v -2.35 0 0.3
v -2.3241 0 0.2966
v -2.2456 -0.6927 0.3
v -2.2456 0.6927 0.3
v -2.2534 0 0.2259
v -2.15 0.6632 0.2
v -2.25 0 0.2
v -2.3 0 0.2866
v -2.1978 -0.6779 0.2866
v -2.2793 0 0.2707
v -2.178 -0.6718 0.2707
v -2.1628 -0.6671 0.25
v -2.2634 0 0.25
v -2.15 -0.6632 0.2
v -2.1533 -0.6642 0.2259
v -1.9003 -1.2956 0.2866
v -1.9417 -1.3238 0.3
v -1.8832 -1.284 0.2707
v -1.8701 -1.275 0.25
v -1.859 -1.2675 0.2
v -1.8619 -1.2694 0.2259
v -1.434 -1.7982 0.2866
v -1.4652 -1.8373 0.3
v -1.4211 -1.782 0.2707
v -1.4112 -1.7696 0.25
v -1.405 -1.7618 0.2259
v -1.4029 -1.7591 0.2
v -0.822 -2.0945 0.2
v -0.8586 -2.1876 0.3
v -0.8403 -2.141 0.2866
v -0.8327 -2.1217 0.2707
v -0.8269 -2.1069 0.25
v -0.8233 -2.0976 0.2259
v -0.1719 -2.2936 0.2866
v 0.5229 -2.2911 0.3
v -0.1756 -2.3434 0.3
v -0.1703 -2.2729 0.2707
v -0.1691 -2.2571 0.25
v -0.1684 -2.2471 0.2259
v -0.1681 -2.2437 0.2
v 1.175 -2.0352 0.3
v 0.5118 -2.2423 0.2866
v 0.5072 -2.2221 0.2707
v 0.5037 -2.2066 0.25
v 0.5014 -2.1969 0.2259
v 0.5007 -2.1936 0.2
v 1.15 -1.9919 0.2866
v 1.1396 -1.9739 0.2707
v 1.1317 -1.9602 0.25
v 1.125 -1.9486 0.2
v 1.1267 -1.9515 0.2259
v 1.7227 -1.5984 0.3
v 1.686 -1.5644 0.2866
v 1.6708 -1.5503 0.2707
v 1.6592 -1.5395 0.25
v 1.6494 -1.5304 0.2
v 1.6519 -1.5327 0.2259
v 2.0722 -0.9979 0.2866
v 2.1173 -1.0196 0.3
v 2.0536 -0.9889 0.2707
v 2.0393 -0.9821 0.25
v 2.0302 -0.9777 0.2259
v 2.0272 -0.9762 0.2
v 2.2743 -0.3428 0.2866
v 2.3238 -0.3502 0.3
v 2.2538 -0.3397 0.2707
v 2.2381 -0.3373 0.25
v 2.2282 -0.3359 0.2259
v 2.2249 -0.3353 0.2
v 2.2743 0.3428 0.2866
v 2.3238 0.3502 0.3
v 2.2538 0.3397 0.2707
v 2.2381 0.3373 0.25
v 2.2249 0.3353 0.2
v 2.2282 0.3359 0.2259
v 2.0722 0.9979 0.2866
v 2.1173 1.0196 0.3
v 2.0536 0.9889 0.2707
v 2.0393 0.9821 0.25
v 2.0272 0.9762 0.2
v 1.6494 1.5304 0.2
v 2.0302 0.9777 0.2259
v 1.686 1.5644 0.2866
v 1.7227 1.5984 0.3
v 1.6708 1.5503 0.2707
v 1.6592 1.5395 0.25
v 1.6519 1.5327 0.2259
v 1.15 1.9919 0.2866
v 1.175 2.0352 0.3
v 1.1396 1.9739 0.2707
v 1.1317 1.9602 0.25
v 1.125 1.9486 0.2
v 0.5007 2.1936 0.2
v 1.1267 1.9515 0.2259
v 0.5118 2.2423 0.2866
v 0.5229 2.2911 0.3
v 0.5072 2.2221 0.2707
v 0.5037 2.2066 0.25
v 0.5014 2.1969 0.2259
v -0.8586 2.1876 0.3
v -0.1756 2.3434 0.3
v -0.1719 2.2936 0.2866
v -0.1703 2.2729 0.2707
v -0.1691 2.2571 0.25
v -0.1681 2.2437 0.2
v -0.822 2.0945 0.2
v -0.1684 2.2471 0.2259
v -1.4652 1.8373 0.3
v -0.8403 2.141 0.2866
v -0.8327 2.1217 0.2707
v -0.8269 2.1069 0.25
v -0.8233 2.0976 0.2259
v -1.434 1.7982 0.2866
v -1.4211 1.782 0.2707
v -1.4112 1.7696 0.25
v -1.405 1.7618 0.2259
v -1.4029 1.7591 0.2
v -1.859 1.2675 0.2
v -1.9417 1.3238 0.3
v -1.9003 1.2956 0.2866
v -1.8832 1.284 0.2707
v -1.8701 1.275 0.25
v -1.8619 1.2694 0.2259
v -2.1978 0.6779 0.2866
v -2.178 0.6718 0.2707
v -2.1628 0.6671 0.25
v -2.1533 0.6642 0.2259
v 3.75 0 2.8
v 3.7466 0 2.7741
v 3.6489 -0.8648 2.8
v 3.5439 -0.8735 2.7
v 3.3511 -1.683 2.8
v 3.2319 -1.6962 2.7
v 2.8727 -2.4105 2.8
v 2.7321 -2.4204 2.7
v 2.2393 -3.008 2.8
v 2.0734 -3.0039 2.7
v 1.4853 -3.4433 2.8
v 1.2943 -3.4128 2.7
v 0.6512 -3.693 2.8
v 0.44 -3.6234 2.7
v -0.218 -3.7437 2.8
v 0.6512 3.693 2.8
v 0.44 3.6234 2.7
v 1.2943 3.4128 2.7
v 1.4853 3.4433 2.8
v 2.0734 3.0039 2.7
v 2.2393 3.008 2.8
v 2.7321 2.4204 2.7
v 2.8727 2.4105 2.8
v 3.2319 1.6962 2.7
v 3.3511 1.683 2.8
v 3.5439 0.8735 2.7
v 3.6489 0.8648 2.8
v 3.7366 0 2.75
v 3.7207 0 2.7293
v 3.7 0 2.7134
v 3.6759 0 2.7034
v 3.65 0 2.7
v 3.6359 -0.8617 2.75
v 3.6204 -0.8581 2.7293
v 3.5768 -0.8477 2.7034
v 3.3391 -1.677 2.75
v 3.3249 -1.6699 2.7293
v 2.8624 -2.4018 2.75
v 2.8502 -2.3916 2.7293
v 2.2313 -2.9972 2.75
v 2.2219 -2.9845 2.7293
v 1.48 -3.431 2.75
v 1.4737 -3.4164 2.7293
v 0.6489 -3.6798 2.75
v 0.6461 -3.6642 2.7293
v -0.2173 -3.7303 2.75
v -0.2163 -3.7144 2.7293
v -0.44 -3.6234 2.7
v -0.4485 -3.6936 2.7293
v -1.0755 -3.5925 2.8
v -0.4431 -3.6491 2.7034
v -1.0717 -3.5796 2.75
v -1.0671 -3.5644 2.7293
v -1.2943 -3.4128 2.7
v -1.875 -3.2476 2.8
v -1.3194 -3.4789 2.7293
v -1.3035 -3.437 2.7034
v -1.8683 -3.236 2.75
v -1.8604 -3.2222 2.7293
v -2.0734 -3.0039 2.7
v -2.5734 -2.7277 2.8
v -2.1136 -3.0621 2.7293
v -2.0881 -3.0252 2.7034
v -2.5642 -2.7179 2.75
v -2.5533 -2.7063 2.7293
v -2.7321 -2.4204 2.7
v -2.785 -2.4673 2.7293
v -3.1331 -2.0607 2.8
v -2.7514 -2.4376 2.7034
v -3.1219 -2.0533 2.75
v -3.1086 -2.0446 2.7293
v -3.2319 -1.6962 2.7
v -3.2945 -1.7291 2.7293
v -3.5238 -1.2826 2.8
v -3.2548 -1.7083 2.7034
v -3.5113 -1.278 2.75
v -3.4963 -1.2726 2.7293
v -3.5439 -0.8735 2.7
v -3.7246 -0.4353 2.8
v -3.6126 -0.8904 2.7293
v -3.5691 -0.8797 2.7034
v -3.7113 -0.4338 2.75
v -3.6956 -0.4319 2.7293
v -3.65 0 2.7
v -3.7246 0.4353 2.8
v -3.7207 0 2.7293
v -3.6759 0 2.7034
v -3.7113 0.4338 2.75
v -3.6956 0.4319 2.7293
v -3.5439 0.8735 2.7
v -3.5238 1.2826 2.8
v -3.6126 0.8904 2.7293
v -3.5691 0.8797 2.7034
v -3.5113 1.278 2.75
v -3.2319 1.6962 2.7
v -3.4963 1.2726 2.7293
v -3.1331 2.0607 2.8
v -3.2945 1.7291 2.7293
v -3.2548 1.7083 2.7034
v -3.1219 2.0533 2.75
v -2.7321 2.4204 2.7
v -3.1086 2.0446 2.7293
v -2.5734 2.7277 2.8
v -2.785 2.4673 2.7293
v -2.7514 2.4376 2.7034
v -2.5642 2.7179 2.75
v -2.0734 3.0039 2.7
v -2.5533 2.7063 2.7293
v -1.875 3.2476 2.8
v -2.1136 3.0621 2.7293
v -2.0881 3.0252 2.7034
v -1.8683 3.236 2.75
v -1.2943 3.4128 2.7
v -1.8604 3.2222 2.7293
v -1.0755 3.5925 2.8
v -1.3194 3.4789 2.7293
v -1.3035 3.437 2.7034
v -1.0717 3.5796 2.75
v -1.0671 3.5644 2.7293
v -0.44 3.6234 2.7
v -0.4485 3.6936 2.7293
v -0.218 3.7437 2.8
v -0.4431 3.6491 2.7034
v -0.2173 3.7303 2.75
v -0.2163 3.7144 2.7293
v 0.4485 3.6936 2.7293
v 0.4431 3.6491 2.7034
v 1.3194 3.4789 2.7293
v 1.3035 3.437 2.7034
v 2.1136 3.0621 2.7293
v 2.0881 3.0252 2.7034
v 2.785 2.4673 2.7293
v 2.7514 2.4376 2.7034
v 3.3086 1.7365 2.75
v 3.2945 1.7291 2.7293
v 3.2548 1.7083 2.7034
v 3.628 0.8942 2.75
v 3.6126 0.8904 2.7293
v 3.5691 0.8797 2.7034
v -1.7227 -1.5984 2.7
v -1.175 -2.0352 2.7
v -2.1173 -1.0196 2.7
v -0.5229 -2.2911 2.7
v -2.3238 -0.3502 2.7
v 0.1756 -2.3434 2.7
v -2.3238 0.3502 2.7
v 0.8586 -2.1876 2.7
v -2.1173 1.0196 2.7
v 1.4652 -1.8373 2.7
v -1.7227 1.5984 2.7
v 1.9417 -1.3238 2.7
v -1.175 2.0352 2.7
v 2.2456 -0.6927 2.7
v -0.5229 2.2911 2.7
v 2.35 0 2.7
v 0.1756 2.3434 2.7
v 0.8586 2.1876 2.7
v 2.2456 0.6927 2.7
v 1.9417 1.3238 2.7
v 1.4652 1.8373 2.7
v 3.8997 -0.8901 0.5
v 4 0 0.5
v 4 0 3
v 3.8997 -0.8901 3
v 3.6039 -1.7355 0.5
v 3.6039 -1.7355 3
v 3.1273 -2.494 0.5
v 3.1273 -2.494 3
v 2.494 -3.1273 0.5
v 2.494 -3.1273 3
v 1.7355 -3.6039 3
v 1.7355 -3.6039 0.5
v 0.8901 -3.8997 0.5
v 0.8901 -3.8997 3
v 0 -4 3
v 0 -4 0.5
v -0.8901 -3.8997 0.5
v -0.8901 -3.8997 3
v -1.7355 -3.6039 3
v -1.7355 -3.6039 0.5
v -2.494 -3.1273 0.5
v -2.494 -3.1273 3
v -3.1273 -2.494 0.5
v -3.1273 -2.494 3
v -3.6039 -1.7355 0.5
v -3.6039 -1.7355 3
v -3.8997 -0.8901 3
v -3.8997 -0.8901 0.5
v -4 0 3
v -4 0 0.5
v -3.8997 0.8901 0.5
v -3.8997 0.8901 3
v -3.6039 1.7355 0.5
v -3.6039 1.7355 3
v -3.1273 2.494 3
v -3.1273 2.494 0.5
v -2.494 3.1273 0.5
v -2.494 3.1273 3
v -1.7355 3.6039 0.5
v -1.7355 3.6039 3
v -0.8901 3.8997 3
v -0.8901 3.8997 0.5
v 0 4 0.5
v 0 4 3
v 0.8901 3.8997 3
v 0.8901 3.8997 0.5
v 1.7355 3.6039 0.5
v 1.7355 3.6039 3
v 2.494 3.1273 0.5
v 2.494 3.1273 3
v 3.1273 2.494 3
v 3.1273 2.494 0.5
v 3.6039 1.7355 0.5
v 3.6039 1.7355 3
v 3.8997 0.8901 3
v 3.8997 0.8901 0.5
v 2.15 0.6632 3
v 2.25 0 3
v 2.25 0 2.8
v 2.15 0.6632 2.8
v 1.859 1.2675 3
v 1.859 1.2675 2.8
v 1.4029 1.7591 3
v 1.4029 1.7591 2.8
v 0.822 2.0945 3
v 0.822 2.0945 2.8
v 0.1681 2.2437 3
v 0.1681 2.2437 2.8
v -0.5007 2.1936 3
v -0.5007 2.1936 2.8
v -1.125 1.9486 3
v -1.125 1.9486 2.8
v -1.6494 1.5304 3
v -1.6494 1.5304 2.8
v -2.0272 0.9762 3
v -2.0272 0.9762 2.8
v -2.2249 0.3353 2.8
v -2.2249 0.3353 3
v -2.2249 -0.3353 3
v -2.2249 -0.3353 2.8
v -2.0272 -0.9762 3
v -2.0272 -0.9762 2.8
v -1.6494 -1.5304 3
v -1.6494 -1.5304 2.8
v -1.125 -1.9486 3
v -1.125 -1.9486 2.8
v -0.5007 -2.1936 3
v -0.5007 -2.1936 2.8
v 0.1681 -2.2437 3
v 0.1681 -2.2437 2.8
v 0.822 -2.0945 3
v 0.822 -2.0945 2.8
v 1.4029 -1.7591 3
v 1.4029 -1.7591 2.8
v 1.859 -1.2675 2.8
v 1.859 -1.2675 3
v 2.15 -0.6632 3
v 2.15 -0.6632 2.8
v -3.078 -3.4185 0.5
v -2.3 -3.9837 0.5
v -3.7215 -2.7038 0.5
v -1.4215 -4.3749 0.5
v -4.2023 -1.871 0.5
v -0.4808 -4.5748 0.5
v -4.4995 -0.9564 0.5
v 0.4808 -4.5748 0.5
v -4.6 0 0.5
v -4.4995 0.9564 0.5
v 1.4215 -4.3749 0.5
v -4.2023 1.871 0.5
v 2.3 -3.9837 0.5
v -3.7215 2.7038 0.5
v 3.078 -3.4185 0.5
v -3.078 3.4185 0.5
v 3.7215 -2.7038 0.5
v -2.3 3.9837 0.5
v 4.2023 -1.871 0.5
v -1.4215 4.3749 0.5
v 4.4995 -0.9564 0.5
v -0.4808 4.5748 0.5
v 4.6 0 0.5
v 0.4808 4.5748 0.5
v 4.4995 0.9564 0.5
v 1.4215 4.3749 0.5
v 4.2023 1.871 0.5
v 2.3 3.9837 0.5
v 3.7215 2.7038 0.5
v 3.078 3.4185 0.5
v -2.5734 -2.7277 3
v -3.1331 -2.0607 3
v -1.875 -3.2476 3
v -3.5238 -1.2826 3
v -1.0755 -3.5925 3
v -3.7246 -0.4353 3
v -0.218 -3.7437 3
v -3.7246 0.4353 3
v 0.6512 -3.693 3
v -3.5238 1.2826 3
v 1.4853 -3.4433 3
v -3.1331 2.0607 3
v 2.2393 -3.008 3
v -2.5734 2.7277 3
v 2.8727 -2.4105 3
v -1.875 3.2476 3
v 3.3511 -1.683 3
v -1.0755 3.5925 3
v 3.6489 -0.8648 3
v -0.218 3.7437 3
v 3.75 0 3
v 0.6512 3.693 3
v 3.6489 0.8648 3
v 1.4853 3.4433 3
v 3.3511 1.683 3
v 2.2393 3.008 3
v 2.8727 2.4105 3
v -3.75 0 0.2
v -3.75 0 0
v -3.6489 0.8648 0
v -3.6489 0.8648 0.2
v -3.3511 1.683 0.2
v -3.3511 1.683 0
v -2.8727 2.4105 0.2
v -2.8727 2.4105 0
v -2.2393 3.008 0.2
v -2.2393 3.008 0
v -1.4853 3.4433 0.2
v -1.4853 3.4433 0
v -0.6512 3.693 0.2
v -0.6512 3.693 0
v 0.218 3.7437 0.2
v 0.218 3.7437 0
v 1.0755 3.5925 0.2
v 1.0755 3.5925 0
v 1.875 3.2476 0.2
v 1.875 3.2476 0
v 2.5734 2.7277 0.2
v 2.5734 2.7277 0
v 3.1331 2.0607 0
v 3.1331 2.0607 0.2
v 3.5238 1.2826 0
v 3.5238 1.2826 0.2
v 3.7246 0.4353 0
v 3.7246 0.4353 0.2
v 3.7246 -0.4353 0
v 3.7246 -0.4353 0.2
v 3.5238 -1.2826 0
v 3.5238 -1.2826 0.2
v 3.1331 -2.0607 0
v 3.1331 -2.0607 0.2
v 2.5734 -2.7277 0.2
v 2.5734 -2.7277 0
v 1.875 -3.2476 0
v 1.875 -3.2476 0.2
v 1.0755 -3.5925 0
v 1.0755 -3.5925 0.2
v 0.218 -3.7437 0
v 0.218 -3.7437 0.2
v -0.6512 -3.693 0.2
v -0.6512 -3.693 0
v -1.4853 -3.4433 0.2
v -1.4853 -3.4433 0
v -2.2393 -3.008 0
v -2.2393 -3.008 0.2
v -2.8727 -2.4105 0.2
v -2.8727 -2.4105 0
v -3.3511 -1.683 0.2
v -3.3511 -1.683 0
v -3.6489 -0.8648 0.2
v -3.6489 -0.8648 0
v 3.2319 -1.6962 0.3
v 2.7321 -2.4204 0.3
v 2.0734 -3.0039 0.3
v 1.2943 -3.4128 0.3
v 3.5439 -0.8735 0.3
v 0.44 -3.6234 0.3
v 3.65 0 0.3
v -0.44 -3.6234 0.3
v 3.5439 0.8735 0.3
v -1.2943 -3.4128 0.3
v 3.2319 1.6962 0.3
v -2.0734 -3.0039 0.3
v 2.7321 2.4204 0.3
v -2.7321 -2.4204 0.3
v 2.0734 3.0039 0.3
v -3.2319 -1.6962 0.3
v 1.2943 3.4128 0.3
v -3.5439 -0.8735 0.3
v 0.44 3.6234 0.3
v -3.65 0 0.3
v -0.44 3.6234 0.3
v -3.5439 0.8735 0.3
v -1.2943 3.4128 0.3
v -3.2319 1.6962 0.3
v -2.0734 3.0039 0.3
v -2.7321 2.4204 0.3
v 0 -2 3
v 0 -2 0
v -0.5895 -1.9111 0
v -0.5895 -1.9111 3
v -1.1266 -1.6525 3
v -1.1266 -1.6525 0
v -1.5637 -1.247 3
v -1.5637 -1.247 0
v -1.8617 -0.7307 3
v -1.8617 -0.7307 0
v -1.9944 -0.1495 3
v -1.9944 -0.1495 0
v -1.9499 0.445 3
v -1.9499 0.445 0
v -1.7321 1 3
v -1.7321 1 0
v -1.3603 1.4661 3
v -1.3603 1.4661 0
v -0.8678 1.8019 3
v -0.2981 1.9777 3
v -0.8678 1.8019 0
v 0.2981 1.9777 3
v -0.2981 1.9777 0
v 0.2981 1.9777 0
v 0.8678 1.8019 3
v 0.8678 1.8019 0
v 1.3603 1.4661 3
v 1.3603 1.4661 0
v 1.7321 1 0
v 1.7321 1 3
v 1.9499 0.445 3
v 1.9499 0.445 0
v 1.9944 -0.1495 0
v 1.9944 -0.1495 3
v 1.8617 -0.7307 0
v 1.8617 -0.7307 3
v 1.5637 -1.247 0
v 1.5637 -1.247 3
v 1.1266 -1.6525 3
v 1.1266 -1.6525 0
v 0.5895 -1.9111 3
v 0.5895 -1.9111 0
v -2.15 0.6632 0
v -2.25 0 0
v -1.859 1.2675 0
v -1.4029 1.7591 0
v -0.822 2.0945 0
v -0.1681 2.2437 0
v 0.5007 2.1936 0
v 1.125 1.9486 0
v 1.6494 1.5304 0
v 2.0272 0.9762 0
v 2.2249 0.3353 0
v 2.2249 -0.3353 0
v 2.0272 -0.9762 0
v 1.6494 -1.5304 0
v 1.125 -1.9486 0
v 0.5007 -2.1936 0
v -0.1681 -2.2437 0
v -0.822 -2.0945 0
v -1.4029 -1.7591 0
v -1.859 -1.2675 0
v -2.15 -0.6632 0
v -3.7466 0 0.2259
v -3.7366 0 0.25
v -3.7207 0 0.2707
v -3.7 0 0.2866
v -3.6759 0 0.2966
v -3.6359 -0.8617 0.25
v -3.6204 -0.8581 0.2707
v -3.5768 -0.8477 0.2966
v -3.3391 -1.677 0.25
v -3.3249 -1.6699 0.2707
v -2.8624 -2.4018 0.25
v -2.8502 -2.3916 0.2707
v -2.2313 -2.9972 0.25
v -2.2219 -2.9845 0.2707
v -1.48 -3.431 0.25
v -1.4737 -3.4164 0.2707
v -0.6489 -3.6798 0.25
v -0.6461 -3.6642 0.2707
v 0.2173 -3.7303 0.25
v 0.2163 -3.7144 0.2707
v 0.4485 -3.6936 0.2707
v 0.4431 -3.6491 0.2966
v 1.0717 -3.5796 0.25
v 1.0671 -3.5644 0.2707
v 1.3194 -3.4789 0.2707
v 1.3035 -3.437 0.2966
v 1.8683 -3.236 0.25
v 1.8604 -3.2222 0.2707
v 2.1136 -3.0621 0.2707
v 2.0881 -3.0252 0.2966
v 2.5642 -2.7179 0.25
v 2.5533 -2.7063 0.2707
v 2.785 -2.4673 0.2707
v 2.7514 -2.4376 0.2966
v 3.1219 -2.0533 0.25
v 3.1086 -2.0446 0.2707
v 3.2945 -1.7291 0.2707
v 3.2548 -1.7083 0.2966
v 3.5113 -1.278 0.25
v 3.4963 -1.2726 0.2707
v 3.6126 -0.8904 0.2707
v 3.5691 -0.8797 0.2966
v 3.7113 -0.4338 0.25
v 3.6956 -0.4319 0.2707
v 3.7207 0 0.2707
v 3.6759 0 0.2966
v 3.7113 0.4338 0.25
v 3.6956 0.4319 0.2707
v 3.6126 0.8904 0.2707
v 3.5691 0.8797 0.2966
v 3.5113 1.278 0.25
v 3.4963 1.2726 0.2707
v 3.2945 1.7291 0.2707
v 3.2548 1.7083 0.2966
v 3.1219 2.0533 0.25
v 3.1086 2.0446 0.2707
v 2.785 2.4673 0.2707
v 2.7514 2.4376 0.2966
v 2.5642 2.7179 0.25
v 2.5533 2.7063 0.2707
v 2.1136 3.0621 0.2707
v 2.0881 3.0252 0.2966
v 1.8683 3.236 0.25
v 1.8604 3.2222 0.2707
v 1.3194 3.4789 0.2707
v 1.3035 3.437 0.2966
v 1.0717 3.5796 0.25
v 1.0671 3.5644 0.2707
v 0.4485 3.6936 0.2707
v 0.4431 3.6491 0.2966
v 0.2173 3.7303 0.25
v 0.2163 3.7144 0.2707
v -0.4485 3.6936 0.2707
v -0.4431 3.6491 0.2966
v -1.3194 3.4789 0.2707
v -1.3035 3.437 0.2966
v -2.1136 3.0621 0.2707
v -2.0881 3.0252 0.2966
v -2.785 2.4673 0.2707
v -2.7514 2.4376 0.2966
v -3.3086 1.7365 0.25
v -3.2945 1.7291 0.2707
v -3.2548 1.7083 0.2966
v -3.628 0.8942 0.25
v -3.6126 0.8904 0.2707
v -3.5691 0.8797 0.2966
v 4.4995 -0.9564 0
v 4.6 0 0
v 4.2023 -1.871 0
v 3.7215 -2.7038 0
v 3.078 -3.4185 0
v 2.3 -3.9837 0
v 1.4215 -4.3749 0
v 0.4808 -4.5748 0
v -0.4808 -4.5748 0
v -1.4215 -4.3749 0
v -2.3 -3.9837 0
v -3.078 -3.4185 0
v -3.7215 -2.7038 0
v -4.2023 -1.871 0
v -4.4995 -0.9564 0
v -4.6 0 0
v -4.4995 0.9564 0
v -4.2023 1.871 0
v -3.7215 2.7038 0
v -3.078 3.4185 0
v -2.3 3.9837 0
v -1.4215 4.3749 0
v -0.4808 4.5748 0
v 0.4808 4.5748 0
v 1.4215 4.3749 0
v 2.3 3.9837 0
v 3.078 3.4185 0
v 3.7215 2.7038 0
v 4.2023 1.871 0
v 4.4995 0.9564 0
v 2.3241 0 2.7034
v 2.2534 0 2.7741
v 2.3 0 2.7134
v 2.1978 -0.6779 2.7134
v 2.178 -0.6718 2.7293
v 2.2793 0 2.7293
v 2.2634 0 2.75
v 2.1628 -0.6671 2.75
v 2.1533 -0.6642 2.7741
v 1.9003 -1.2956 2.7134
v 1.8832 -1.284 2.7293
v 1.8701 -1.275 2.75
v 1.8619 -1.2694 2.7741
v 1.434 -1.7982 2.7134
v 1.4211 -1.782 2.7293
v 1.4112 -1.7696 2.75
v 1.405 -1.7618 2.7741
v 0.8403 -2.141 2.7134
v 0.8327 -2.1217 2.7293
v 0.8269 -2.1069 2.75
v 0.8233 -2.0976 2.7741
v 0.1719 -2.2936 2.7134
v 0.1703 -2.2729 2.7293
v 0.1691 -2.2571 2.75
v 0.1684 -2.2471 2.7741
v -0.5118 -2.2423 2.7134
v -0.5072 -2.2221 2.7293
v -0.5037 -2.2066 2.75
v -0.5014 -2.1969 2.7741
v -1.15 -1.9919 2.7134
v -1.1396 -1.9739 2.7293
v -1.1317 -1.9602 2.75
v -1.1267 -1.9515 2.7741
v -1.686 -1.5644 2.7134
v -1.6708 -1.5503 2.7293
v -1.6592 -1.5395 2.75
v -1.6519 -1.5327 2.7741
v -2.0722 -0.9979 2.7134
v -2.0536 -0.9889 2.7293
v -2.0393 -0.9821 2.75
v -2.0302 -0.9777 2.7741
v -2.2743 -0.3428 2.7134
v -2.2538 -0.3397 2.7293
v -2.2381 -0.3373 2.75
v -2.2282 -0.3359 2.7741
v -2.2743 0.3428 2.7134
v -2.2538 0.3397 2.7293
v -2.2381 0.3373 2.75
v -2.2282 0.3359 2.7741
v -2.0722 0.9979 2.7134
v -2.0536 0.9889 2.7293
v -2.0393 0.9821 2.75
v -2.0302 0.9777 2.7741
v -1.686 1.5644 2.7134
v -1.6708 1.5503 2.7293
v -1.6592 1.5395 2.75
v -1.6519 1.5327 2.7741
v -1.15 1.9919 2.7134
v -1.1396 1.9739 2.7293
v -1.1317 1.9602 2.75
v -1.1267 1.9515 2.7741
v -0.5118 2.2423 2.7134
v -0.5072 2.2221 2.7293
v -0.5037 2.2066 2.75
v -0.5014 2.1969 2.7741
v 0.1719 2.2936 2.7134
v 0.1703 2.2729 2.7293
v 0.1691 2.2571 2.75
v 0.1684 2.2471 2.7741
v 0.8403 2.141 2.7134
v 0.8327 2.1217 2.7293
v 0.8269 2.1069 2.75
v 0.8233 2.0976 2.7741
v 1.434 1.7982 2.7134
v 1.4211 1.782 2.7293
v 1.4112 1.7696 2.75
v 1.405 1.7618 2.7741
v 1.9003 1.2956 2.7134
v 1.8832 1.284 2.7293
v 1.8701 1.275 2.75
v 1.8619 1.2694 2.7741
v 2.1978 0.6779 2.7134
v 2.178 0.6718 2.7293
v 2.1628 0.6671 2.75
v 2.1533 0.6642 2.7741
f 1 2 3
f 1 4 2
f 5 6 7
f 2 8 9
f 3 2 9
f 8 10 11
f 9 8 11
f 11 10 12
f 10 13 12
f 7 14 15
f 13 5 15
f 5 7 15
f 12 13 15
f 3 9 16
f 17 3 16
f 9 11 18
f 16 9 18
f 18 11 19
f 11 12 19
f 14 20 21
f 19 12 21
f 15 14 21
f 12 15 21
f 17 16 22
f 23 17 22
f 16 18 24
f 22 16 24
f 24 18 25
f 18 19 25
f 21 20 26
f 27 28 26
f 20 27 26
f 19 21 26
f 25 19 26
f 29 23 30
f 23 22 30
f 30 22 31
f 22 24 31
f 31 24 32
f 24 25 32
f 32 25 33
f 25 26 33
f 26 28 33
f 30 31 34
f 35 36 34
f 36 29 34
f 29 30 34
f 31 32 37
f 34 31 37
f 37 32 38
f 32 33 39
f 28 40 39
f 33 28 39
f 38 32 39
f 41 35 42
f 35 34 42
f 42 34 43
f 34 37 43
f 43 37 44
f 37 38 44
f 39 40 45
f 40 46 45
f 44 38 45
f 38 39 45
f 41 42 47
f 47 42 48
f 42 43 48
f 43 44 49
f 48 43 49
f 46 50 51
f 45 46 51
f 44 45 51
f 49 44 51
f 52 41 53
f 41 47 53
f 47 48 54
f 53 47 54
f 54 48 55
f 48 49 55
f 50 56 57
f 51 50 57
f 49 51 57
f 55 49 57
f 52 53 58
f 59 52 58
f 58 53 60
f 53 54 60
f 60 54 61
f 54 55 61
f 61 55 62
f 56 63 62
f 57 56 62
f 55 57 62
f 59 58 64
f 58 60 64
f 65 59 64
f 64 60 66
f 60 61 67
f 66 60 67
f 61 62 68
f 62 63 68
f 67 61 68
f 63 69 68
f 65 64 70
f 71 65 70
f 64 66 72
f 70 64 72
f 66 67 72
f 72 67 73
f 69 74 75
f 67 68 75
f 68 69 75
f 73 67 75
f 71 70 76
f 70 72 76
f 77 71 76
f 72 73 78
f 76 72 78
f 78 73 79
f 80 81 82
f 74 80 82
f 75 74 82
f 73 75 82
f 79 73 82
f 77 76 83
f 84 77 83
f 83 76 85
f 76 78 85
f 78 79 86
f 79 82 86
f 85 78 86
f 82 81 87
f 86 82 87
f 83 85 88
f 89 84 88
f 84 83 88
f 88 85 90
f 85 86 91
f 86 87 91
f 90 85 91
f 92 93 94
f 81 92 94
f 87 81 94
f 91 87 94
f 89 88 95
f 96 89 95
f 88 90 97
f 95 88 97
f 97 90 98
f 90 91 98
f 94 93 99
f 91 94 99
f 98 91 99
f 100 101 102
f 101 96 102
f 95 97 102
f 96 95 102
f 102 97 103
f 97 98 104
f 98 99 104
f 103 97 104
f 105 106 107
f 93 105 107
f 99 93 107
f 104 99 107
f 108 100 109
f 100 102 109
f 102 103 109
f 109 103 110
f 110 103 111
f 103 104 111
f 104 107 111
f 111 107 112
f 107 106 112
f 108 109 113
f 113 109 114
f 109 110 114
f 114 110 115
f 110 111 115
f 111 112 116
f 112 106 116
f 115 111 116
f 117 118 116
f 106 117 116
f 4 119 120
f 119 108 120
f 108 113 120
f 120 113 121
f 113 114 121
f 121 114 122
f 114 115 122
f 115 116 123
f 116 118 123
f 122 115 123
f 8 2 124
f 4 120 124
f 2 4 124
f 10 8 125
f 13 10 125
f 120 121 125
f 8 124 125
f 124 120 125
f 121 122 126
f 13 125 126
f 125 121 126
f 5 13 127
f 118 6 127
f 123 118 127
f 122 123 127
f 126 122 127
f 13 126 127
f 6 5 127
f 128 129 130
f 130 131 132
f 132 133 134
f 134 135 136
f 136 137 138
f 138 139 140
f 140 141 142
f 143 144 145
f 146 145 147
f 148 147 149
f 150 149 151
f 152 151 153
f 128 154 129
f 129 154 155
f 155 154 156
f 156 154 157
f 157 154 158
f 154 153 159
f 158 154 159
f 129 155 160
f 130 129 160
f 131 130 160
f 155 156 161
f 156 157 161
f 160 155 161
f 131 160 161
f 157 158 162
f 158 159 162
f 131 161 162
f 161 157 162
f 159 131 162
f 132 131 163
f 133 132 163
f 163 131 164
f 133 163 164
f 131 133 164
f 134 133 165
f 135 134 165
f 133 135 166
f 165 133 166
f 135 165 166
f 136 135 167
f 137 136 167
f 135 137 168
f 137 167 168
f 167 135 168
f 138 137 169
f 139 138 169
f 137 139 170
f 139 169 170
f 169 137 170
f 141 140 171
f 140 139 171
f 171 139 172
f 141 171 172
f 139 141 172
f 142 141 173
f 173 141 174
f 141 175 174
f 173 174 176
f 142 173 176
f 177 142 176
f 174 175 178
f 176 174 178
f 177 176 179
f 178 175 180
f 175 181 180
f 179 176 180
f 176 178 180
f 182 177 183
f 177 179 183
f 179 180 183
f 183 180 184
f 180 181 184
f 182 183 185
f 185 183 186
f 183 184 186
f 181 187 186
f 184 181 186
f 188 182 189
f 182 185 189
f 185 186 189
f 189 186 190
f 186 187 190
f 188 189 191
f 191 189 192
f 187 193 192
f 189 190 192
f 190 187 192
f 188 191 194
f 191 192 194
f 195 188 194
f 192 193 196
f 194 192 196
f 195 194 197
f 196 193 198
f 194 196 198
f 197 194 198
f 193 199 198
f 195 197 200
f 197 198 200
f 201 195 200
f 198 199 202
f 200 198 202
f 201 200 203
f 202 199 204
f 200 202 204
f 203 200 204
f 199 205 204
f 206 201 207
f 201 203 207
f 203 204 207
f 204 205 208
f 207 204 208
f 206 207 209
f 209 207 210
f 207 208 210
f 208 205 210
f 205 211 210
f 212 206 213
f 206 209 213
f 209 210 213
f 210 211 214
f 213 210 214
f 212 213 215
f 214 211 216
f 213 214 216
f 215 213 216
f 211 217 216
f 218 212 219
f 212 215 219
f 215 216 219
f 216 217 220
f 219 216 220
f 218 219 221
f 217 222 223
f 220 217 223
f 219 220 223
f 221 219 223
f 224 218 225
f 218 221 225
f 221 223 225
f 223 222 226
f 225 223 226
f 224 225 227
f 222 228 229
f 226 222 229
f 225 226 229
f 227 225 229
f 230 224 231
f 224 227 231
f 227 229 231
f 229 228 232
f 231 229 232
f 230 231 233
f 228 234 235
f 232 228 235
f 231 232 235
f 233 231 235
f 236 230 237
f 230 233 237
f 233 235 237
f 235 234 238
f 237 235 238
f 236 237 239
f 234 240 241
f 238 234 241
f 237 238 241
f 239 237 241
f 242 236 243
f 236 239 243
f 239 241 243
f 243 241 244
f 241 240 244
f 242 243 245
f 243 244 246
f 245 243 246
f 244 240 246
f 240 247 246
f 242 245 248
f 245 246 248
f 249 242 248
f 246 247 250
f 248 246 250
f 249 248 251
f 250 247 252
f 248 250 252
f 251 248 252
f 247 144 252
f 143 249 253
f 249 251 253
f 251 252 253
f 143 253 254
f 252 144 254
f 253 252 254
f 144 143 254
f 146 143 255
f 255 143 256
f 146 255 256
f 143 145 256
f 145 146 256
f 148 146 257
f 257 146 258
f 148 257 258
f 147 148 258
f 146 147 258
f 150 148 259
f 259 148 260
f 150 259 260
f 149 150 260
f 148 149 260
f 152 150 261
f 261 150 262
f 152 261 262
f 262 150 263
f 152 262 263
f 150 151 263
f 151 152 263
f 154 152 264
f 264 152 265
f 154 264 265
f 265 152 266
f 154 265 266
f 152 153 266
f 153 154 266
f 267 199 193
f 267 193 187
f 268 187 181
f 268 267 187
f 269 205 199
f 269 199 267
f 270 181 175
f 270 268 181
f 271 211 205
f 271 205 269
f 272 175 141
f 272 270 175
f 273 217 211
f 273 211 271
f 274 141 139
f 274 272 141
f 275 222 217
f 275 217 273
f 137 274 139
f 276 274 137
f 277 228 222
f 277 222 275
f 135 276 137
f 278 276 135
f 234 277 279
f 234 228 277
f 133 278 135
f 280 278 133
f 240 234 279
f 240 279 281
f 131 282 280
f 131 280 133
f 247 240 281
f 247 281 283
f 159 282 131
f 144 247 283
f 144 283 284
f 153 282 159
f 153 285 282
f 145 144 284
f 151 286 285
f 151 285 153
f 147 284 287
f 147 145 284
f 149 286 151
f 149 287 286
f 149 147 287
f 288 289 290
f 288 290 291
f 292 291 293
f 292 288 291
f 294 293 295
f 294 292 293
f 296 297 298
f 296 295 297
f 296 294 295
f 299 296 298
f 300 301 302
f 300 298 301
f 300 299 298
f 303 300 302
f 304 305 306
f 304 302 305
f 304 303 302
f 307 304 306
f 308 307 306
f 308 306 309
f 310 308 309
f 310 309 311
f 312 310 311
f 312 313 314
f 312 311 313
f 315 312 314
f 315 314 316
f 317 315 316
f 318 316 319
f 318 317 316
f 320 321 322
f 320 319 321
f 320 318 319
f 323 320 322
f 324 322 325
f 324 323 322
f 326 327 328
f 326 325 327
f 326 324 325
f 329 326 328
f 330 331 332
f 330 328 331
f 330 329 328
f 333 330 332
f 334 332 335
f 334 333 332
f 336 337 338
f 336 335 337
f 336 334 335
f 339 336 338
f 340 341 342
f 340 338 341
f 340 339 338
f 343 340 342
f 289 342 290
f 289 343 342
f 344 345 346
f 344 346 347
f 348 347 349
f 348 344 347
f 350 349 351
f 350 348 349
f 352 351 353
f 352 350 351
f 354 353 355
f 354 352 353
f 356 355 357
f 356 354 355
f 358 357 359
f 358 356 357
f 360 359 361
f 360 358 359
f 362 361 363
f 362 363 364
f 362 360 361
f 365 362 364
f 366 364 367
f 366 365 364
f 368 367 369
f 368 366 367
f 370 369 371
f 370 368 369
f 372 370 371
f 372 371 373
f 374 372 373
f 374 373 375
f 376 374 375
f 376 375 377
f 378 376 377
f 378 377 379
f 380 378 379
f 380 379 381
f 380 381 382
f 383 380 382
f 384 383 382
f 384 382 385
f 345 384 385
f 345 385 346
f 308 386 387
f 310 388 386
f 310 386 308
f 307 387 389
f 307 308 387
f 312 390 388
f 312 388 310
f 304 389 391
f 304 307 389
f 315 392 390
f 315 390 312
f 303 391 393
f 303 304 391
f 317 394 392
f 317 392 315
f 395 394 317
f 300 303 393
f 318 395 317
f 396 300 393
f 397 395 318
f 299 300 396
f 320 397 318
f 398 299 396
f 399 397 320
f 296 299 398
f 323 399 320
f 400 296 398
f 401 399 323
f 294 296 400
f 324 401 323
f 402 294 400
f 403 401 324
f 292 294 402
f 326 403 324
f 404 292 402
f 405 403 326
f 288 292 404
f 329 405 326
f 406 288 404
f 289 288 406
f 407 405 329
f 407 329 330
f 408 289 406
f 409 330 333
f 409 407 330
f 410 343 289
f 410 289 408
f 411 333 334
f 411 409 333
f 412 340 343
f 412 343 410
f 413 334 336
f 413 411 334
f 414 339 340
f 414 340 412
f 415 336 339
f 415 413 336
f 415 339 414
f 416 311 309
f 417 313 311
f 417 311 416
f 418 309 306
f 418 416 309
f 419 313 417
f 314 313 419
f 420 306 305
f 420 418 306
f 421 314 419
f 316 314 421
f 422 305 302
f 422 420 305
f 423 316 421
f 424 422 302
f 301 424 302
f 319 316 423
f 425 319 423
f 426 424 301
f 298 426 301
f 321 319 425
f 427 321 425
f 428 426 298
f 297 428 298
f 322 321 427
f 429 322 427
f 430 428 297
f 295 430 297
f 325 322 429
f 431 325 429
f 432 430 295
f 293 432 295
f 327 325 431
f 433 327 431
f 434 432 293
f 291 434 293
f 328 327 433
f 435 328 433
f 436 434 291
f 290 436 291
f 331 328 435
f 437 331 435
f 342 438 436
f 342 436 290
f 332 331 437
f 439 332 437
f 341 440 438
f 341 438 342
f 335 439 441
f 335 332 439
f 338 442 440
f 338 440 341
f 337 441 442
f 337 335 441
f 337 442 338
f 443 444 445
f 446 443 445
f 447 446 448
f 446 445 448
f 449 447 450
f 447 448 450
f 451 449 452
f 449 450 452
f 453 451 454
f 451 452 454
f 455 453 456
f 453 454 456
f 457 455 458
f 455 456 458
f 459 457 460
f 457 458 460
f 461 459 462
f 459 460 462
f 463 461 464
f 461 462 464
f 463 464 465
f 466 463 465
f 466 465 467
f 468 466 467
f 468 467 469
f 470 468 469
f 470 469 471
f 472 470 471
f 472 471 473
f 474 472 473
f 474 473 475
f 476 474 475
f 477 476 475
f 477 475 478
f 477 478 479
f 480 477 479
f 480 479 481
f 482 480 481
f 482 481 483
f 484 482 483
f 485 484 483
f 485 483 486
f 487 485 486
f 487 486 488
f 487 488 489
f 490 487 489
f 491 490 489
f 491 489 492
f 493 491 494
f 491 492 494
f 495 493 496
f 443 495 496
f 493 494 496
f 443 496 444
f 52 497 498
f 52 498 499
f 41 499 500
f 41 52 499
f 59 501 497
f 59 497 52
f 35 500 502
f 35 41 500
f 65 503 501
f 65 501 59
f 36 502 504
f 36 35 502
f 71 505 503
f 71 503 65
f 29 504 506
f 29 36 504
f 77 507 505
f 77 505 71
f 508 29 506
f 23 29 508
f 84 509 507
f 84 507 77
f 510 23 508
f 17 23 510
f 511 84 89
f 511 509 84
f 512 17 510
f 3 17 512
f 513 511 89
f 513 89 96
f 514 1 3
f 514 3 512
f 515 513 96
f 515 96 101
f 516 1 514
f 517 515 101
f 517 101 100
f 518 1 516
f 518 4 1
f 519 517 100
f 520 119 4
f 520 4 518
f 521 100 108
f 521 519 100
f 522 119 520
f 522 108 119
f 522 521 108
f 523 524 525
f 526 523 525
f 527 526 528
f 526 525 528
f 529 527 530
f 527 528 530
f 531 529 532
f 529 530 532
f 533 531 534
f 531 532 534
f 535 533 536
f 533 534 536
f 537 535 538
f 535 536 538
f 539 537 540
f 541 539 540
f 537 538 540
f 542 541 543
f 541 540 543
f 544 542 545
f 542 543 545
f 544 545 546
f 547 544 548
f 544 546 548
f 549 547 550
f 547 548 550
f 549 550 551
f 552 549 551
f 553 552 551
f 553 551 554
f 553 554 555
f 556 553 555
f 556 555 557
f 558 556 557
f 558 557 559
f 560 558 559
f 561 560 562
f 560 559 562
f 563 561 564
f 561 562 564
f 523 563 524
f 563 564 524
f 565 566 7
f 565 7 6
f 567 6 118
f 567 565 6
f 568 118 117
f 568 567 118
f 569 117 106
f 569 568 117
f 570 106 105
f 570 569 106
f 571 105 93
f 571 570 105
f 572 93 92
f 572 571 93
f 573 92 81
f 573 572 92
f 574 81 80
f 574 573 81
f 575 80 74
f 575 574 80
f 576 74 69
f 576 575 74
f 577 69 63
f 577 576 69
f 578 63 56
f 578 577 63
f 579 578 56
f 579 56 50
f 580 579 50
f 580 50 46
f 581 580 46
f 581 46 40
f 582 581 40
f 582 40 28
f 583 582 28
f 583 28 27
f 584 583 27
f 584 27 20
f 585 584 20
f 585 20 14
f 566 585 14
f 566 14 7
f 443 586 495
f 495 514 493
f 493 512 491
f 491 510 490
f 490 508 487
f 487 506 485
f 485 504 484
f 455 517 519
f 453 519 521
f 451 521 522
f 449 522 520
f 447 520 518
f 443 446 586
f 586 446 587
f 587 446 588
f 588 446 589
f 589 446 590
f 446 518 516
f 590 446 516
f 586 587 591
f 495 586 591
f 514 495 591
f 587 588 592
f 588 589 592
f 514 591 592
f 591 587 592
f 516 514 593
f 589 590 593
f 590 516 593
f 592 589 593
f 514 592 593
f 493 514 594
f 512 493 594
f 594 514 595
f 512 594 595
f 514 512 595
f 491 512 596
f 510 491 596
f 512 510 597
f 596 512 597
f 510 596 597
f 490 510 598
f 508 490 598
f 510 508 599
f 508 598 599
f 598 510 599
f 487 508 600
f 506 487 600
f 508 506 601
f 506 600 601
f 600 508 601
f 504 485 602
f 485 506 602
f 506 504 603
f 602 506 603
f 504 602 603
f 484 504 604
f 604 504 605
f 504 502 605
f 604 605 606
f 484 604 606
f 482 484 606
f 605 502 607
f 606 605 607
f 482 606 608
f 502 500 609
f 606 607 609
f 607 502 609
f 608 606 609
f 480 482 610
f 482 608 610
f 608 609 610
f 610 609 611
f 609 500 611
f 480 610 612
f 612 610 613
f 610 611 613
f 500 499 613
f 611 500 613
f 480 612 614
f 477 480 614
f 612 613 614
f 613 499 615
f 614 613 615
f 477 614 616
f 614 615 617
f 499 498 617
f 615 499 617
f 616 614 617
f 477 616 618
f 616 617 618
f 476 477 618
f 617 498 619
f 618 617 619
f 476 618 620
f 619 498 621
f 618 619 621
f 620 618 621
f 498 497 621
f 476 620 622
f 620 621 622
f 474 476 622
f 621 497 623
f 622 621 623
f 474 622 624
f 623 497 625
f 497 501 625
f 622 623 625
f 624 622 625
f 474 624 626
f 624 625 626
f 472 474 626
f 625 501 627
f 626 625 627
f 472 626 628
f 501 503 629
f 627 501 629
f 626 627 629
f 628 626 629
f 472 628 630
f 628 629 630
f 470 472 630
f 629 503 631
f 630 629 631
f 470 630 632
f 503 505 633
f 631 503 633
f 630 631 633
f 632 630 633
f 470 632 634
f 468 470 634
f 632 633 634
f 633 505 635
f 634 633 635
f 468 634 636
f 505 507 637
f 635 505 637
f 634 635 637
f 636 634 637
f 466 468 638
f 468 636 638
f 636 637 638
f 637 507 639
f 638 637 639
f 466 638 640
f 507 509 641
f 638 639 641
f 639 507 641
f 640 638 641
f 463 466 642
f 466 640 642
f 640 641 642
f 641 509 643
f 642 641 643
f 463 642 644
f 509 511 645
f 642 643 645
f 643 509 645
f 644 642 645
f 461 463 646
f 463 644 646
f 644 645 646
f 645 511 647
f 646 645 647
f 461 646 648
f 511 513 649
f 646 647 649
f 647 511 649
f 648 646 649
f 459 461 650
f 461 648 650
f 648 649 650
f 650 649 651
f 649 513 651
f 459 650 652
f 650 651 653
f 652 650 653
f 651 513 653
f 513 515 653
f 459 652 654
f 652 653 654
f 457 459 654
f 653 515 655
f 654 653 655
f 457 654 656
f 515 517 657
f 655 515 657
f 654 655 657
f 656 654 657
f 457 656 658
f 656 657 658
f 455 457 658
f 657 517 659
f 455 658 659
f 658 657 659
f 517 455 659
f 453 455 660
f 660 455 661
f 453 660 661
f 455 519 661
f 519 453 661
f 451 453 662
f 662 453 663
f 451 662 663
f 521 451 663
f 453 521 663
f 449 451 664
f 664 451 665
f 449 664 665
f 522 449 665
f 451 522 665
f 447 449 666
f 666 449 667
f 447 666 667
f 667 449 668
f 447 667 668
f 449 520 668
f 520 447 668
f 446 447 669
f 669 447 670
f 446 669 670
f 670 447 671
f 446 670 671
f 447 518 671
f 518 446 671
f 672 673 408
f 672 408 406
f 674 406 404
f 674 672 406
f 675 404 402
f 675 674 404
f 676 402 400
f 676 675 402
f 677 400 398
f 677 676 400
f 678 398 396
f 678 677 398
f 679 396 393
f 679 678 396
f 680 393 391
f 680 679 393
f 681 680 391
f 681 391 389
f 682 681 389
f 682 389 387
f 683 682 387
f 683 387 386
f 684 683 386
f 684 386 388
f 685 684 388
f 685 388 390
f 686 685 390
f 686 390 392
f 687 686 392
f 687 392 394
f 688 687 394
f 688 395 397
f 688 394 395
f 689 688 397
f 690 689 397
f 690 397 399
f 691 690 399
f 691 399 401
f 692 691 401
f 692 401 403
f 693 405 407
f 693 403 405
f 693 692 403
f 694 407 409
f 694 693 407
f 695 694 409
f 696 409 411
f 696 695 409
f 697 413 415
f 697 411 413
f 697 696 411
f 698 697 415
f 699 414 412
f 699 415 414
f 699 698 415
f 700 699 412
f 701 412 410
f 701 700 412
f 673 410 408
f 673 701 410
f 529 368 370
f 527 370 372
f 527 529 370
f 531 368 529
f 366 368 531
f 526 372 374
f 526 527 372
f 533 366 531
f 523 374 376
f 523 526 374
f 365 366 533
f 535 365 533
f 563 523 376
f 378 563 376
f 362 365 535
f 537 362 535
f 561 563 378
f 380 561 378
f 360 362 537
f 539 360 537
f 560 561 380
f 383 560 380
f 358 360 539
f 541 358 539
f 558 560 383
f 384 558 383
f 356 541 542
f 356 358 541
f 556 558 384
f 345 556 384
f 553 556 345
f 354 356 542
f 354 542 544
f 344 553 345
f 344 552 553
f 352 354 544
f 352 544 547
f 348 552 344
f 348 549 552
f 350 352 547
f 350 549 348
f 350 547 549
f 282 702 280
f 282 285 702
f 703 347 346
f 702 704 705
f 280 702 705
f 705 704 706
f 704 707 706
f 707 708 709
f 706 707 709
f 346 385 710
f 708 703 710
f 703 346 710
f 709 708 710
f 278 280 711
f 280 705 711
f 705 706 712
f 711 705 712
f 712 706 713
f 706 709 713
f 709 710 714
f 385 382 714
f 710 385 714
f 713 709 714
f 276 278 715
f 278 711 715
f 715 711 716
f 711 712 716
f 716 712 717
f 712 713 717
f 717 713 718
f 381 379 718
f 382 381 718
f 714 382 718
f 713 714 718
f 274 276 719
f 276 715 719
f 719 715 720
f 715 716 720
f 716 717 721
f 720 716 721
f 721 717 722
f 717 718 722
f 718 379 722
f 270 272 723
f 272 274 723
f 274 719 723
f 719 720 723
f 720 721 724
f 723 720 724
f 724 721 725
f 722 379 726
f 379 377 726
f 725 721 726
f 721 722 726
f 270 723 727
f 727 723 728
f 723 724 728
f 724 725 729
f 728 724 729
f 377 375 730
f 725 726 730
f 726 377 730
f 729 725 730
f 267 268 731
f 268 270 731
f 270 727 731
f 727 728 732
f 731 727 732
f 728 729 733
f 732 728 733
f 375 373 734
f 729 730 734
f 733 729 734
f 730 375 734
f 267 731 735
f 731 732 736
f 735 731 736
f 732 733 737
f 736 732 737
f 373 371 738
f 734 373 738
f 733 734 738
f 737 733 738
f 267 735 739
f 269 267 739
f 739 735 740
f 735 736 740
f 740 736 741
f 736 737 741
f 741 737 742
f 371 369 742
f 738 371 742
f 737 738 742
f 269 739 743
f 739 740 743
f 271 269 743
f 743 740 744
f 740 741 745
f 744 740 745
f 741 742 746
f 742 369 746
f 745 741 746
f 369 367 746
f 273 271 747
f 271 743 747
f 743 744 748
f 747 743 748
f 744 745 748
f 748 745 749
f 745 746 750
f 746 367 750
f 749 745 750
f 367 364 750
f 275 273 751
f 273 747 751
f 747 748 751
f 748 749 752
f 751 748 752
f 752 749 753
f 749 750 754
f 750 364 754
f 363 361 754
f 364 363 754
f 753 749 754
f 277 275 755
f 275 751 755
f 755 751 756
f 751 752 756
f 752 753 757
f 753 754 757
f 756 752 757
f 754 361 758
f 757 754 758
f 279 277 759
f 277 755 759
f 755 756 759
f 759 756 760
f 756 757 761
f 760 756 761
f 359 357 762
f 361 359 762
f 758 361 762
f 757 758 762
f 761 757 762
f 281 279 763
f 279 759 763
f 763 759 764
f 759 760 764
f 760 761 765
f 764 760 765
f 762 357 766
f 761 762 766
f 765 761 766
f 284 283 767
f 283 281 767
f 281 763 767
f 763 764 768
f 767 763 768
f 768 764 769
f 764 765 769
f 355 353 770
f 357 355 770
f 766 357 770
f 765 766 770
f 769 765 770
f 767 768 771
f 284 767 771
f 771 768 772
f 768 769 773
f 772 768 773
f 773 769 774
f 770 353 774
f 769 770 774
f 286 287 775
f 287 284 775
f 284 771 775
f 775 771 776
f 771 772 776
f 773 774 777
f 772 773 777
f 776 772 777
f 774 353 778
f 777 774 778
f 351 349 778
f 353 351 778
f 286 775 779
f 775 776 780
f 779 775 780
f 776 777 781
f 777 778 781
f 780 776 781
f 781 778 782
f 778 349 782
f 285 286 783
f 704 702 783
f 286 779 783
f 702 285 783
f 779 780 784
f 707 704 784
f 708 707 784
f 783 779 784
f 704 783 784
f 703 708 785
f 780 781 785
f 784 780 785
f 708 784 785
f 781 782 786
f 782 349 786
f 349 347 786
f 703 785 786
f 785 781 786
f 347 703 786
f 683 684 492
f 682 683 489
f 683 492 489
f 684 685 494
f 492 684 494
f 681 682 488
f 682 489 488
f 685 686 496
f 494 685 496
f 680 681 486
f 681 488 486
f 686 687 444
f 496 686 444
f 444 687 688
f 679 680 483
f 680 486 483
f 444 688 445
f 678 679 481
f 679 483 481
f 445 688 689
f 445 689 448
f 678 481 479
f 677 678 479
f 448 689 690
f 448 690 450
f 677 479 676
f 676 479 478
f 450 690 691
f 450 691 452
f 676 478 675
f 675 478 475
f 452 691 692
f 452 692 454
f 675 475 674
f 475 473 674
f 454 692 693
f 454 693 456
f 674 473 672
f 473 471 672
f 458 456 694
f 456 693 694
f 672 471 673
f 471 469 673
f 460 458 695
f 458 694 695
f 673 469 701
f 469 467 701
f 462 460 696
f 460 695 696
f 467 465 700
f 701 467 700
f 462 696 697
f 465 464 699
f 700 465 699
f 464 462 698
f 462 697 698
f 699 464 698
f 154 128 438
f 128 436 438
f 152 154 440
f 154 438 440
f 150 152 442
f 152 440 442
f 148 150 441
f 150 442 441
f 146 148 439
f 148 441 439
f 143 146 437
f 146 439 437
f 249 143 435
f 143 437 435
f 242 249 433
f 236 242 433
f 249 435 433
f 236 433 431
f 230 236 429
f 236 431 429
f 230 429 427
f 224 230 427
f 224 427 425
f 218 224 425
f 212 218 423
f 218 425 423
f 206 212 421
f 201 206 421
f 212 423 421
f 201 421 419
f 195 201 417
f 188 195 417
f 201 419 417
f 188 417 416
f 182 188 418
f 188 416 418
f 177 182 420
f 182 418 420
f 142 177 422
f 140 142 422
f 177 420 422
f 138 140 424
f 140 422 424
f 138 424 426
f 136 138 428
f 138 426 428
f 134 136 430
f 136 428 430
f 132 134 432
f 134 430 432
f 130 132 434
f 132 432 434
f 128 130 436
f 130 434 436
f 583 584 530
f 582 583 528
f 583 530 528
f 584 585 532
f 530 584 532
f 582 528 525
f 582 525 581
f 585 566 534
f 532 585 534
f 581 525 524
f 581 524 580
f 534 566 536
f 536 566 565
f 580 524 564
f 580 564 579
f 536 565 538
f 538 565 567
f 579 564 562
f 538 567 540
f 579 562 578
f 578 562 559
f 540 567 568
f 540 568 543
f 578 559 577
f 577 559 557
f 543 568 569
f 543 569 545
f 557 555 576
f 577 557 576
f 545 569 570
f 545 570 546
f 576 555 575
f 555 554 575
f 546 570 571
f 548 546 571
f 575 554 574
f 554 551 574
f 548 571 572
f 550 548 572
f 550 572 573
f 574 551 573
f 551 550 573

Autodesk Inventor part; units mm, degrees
ref_plane "YZ Plane" through (0, 0, 0) normal (1, 0, 0) x (0, 1, 0)
ref_plane "XZ Plane" through (0, 0, 0) normal (0, 1, 0) x (-1, 0, 0)
ref_plane "XY Plane" through (0, 0, 0) normal (0, 0, 1) x (1, 0, 0)
sketch "スケッチ1" plane through (0, 0, 0) normal (0, 0, 1) x (1, 0, 0)
  circle A0 centre (0, 0) radius 4.6
  dimension "d0" = 9.2
extrude "押し出し1" add sketch "スケッチ1" along normal blind 0.5
sketch "スケッチ2" plane through (0, 0, 0.5) normal (0, 0, 1) x (1, 0, 0)
  circle A0 centre (0, 0) radius 4.6 projected
  circle A1 centre (0, 0) radius 4
  dimension "d3" = 8
extrude "押し出し2" add sketch "スケッチ2" along normal blind 2.5 contours A1
sketch "スケッチ3" plane through (0, 0, 3) normal (0, 0, 1) x (1, 0, 0)
  circle A0 centre (0, 0) radius 4 projected
  circle A1 centre (0, 0) radius 2
  dimension "d6" = 4
hole "穴1" at (0, 0, 3) direction (0, 0, -1) diameter 4 end through all
sketch "スケッチ4" plane through (0, 0, 3) normal (0, 0, 1) x (1, 0, 0)
  circle A0 centre (0, 0) radius 4 projected
  circle A1 centre (0, 0) radius 3.75
  circle A2 centre (0, 0) radius 2.25
  dimension "d14" = 4.5
  dimension "d15" = 7.5
extrude "押し出し3" cut sketch "スケッチ4" against normal blind 0.3 contours A1
sketch "スケッチ5" plane through (0, 0, 0) normal (0, 0, -1) x (-1, 0, 0)
  circle A0 centre (0, 0) radius 4.6 projected
  circle A1 centre (0, 0) radius 3.75
  circle A2 centre (0, 0) radius 2.25
  dimension "d18" = 4.5
  dimension "d19" = 7.5
extrude "押し出し4" cut sketch "スケッチ5" against normal blind 0.3 contours A1
fillet "フィレット1" radius 0.1 4 edges at (2.25, 0, 0.3) (3.75, 0, 0.3) (-2.25, 0, 2.7) (-3.75, 0, 2.7)
properties part number "40" material "ステンレス鋼"
